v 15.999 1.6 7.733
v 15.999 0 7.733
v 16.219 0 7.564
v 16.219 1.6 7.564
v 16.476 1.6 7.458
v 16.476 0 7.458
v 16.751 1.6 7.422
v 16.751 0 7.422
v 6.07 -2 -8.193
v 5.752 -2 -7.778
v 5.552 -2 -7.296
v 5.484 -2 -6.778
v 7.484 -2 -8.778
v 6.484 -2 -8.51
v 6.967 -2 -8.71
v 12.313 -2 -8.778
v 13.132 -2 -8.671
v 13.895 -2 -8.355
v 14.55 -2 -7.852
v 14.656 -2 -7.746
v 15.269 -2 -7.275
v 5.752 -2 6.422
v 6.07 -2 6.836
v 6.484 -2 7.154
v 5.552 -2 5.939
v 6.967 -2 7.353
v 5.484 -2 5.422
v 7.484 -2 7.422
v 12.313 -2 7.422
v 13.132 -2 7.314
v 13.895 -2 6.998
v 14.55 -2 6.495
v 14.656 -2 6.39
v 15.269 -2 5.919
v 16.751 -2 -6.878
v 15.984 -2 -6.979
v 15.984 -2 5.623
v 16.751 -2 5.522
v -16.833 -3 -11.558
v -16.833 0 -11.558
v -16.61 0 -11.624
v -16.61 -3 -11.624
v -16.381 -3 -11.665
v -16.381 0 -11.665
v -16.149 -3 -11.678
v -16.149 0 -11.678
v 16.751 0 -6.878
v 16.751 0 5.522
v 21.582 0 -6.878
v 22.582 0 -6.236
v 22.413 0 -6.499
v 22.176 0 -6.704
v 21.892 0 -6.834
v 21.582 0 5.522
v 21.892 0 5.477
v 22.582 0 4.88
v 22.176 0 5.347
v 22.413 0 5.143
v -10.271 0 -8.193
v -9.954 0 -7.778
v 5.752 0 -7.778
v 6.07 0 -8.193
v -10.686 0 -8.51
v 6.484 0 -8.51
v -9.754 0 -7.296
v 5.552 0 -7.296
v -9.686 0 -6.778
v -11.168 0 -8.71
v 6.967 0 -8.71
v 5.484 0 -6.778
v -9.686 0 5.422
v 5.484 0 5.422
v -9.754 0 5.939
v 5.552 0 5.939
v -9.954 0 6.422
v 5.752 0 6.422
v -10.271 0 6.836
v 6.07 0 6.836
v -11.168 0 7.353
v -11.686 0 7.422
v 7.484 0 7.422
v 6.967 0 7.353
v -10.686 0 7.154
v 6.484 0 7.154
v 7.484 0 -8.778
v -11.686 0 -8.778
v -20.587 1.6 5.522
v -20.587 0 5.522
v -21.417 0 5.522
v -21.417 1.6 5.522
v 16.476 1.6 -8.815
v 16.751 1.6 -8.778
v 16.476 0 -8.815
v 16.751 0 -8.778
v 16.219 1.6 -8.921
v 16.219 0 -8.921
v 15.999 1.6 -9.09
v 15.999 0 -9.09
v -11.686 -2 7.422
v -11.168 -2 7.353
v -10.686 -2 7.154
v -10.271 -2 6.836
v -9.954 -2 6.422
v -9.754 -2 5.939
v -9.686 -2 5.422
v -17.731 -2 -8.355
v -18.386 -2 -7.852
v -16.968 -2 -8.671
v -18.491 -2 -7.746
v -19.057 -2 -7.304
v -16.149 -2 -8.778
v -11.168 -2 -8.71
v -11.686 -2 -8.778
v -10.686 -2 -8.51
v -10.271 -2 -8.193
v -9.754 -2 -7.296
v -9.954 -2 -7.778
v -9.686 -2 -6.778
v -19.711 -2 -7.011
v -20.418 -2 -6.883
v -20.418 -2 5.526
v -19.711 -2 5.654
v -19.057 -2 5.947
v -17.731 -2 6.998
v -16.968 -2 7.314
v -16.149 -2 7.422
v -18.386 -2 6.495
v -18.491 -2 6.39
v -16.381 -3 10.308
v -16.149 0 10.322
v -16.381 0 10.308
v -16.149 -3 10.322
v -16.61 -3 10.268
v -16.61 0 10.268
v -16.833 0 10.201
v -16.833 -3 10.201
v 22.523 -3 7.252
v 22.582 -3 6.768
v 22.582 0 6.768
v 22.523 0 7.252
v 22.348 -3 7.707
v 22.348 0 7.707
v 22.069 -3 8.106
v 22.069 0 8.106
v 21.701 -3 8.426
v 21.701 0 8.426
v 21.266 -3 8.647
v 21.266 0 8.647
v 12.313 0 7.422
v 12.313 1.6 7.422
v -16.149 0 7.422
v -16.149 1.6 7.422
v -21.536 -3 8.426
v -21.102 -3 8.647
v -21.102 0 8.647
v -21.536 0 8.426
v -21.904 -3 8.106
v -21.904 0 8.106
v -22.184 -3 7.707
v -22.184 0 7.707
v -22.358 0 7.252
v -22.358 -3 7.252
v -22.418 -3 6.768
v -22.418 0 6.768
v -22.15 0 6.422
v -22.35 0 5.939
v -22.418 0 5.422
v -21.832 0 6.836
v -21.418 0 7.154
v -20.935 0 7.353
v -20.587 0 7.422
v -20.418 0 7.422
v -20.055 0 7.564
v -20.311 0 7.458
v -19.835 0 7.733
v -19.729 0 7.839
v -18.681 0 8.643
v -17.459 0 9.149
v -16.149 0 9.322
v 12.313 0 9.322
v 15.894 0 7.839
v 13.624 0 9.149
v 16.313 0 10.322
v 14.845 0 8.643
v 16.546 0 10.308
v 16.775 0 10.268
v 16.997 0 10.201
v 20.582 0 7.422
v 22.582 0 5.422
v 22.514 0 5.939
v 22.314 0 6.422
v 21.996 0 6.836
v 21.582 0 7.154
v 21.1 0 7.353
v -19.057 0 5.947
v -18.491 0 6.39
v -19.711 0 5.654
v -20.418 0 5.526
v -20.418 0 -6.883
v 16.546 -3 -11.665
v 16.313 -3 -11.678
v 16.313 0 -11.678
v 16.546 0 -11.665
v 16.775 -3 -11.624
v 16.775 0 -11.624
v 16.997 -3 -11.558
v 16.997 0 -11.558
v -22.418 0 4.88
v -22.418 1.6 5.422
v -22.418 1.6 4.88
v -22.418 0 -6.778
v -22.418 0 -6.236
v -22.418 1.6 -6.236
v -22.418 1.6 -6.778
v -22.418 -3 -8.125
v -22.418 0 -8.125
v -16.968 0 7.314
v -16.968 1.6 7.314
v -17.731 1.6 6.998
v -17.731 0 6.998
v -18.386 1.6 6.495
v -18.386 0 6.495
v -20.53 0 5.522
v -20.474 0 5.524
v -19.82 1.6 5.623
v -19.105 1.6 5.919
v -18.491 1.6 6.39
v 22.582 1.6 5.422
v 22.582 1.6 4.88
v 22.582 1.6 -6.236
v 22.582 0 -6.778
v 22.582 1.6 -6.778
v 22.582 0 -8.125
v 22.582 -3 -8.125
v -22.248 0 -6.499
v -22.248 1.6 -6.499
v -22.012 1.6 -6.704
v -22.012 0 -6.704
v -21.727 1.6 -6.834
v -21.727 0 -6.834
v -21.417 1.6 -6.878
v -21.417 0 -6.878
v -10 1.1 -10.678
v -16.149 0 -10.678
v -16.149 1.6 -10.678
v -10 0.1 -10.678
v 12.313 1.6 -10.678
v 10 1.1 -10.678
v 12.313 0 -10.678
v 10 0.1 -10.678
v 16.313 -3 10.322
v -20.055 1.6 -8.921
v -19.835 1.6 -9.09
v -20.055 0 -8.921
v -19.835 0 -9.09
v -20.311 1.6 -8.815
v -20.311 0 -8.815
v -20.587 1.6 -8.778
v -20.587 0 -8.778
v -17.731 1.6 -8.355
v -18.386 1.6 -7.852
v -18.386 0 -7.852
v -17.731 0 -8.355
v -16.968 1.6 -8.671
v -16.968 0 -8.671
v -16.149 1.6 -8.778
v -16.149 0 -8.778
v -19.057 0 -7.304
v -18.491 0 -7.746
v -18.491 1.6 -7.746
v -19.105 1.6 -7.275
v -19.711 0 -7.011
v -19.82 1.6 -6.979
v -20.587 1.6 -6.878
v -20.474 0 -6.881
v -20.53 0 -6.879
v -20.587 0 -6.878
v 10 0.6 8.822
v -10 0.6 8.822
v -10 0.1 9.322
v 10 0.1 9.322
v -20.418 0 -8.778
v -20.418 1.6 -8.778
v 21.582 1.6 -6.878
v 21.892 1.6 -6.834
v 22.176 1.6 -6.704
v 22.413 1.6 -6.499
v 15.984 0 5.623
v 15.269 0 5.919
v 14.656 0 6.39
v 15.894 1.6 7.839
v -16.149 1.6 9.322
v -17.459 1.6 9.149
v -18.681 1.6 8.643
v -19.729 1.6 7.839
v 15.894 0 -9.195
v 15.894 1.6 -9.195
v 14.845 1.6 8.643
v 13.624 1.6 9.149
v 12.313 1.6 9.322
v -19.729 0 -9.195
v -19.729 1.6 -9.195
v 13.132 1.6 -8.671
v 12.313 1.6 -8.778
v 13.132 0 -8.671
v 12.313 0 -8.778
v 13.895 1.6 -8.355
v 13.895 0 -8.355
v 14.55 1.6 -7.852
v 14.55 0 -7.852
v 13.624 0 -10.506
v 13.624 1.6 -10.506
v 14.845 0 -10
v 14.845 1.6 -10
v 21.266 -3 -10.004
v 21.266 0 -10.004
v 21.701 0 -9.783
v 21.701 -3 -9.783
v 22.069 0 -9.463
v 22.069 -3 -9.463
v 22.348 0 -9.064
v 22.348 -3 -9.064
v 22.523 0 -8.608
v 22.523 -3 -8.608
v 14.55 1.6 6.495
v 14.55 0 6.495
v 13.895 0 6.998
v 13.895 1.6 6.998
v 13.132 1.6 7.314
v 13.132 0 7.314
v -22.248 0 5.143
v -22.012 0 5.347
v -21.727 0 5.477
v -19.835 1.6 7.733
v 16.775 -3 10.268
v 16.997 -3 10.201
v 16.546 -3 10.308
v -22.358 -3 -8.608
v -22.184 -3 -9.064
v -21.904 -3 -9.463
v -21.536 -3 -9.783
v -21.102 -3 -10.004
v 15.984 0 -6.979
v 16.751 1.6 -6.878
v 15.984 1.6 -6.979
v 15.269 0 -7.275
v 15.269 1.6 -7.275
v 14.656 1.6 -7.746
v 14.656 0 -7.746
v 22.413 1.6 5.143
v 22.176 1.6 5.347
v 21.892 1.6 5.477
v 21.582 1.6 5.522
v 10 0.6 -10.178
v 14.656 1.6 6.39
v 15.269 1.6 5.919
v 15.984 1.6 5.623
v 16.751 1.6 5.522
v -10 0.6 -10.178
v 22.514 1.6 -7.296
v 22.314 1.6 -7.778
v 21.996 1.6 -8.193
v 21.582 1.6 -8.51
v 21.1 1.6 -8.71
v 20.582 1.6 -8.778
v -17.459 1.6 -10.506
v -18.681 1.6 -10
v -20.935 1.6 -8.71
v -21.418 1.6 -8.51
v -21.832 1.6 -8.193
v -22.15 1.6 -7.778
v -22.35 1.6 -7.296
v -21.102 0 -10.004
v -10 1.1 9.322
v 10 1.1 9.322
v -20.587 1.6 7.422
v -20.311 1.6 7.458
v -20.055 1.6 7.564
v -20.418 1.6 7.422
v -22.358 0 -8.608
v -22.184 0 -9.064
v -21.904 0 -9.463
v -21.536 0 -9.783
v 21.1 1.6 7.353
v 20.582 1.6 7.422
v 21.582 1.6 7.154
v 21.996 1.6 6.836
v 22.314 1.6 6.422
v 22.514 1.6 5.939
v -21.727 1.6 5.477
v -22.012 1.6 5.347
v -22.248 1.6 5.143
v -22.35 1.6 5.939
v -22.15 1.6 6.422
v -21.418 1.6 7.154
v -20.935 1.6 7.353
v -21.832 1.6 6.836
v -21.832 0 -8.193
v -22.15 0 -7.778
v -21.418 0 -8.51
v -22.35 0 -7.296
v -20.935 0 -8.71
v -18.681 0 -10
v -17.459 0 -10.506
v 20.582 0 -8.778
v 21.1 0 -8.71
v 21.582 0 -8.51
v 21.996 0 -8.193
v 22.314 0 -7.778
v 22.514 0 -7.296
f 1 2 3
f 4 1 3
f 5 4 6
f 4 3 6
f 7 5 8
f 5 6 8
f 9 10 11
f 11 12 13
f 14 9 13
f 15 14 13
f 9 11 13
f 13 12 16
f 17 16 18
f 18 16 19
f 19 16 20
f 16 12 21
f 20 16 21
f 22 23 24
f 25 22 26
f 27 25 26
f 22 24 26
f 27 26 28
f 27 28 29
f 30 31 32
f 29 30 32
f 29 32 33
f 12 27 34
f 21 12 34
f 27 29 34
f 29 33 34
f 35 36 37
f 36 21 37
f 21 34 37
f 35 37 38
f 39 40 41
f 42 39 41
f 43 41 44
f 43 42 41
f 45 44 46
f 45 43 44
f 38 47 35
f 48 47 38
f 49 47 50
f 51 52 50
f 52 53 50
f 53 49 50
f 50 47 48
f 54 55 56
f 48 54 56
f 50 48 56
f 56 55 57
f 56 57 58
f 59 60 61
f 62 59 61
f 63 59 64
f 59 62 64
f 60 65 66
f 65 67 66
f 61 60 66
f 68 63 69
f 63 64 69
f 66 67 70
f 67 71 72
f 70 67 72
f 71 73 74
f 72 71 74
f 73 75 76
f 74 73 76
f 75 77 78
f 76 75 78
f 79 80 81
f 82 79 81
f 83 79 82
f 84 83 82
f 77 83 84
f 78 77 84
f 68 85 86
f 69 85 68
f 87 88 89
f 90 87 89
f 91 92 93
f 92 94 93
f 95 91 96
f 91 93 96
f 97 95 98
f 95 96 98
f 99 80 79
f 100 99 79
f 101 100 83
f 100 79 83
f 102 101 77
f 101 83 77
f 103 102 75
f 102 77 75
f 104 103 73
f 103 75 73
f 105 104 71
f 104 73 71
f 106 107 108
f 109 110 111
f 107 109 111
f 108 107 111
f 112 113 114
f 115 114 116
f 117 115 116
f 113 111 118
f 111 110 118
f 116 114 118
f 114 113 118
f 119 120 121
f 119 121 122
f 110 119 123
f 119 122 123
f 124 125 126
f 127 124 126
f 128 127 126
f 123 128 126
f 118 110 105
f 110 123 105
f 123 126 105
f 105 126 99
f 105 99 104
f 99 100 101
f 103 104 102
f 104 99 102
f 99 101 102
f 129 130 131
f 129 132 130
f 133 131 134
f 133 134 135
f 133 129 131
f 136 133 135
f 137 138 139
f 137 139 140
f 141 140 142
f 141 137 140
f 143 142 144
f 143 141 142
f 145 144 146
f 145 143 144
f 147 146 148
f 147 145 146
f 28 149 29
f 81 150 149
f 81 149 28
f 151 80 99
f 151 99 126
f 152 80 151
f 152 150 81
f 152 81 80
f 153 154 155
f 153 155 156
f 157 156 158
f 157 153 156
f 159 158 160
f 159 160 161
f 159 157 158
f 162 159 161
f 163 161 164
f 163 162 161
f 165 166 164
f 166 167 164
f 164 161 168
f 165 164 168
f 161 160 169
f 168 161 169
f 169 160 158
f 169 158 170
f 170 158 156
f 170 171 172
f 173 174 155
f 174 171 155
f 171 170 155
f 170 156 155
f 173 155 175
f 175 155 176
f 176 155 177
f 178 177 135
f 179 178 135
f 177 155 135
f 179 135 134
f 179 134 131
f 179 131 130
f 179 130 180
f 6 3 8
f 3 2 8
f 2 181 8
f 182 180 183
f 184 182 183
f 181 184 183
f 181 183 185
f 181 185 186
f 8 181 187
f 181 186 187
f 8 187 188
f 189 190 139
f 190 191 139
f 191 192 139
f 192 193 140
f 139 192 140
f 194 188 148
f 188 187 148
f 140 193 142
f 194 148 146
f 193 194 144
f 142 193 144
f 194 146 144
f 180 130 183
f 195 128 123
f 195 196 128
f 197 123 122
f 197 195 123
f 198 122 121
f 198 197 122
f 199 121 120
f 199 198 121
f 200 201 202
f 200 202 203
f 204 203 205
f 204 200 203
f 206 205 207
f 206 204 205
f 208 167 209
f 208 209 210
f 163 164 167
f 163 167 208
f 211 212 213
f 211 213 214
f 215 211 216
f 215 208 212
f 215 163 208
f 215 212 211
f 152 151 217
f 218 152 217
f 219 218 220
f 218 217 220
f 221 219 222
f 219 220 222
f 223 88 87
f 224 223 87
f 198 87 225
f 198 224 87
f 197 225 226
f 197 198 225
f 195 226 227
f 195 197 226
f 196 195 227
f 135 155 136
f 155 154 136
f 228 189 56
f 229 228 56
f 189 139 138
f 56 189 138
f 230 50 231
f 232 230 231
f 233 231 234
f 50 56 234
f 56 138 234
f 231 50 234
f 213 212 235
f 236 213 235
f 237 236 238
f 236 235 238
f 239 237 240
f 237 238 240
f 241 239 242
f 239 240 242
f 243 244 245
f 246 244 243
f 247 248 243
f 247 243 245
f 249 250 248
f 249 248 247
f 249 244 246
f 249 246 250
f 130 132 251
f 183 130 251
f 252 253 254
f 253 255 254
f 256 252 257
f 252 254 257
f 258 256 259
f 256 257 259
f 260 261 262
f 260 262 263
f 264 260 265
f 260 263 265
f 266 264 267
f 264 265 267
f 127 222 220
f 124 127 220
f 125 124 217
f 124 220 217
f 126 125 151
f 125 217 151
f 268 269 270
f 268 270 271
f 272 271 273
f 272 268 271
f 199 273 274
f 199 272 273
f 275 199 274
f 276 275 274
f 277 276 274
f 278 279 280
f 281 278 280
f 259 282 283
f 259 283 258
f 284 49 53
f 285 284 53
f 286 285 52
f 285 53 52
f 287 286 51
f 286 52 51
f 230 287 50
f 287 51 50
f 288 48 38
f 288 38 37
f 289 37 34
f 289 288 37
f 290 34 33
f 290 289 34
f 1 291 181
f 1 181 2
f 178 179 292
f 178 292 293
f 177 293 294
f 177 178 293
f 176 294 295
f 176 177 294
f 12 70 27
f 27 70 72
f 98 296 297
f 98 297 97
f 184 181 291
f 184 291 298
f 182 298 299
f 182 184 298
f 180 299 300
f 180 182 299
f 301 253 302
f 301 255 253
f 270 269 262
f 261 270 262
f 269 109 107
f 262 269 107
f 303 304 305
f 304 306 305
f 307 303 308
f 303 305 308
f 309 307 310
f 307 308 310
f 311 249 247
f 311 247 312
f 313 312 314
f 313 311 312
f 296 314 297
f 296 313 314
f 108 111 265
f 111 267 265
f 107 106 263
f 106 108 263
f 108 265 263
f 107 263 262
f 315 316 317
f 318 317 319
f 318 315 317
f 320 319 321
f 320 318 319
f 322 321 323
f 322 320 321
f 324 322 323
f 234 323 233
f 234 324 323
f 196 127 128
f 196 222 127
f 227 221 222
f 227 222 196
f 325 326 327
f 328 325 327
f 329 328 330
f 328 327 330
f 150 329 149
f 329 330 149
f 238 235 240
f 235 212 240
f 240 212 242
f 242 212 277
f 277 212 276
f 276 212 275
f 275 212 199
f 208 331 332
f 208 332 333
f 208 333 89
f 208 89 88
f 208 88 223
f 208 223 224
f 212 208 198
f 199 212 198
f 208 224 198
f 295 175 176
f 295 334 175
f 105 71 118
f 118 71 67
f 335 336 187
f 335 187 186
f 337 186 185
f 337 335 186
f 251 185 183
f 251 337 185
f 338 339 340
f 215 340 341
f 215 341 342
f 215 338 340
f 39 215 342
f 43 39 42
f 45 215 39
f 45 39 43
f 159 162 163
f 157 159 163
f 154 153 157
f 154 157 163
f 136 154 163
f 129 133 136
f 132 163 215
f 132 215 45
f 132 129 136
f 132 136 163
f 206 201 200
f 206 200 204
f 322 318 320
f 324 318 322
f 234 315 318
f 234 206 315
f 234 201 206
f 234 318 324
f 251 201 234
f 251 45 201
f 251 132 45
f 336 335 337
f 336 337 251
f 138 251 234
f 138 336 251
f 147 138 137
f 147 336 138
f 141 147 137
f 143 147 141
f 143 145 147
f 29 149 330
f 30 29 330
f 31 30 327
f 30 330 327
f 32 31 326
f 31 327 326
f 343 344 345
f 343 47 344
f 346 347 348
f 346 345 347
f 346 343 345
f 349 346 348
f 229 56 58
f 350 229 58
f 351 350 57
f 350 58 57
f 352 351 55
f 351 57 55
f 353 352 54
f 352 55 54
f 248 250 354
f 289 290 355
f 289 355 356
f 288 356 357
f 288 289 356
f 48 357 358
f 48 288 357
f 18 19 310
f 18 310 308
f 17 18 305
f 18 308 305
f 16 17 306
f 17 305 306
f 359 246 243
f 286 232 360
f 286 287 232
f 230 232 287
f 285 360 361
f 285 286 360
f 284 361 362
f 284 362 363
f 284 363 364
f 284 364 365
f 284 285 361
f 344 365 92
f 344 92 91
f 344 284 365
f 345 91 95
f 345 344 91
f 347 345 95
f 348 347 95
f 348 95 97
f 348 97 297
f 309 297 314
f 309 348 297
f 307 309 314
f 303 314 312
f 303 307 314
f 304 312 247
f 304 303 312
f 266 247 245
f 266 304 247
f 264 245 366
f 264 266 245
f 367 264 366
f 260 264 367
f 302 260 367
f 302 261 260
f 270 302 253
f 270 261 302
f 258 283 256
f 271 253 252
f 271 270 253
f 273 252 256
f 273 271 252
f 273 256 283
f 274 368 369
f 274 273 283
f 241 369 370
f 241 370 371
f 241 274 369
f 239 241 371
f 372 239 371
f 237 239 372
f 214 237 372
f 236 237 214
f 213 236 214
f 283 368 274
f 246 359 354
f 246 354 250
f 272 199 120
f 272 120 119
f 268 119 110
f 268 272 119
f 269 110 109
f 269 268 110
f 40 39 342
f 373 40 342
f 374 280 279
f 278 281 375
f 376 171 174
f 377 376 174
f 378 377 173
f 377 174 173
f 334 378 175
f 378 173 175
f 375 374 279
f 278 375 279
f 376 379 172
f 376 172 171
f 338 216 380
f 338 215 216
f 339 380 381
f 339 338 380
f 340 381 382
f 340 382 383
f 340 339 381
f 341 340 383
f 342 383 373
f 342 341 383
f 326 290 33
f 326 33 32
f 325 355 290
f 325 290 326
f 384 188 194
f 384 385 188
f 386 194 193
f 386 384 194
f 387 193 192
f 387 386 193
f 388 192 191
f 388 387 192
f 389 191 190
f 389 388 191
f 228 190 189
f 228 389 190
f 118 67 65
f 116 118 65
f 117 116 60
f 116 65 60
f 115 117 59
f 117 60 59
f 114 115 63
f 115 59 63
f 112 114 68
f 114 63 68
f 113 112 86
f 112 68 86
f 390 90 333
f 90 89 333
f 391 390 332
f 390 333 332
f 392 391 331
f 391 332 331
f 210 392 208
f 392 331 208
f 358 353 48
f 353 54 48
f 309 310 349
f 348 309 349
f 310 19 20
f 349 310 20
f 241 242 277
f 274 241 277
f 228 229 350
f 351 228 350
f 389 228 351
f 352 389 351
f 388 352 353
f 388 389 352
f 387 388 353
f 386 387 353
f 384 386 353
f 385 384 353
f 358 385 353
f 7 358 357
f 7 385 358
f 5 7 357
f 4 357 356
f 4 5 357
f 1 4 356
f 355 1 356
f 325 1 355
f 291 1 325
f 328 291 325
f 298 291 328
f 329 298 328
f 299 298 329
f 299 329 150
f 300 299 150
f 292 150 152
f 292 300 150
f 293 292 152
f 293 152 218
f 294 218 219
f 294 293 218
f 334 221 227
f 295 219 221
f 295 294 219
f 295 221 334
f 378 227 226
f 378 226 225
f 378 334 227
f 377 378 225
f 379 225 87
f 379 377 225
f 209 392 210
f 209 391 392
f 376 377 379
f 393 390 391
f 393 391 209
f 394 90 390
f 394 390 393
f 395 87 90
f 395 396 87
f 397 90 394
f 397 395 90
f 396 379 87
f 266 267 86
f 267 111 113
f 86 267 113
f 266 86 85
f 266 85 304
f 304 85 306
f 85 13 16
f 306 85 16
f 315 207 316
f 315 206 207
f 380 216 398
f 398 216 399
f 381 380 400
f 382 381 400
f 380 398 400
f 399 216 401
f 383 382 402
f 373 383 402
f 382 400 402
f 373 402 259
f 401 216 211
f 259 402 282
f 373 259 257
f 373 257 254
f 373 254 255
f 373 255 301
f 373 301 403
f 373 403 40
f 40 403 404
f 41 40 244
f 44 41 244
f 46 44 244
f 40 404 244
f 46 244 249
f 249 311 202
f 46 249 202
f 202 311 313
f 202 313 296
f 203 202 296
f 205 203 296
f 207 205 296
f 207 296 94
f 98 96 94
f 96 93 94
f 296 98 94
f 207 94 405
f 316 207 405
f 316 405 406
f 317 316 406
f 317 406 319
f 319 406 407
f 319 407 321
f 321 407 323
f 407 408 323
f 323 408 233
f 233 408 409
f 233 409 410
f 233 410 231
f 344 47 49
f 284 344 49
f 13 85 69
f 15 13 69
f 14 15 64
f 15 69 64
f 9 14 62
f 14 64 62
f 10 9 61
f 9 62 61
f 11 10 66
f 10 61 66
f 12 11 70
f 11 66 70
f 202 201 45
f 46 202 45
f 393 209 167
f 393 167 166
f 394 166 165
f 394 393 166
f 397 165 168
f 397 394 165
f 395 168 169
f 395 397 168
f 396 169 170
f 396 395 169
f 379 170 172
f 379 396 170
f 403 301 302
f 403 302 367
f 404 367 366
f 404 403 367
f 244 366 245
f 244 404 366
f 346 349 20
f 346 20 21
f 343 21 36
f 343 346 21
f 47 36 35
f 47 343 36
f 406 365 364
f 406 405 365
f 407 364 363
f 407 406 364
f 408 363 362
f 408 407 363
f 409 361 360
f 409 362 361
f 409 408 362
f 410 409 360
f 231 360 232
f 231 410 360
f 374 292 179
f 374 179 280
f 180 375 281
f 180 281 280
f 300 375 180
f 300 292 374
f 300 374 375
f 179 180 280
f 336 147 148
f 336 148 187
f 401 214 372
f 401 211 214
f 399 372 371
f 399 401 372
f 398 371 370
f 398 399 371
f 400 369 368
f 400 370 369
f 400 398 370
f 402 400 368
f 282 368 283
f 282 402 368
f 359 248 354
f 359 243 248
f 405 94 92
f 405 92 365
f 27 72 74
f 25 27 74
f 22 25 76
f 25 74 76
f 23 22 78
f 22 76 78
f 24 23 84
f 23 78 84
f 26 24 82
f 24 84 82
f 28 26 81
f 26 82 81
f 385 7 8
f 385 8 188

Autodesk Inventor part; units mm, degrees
ref_plane "YZ Plane" through (0, 0, 0) normal (1, 0, 0) x (0, 1, 0)
ref_plane "XZ Plane" through (0, 0, 0) normal (0, 1, 0) x (-1, 0, 0)
ref_plane "XY Plane" through (0, 0, 0) normal (0, 0, 1) x (1, 0, 0)
sketch "Sketch1" plane through (0, 0, 0) normal (0, 1, 0) x (-1, 0, 0)
  line L0 (-21.5822, -6.7784) -> (-16.7522, -6.7784)
  arc A0 (-14.5842, -7.6764) -> (-16.7522, -6.7784) centre (-16.751, -9.8416) ccw
  line L1 (-14.5842, -7.6764) -> (-14.4802, -7.7804)
  arc A1 (-14.4802, -7.7804) -> (-12.3122, -8.6784) centre (-12.3134, -5.6152) ccw
  line L2 (-12.3122, -8.6784) -> (16.1478, -8.6784)
  arc A2 (16.1478, -8.6784) -> (18.3158, -7.7804) centre (16.149, -5.6152) ccw
  line L3 (18.3158, -7.7804) -> (18.4198, -7.6764)
  arc A3 (20.5878, -6.7784) -> (18.4198, -7.6764) centre (20.5866, -9.8416) ccw
  line L4 (20.5878, -6.7784) -> (21.4178, -6.7784)
  arc A4 (21.4178, -6.7784) -> (22.4178, -5.7784) centre (21.4174, -5.778) ccw
  line L5 (22.4178, -5.7784) -> (22.4178, 4.4216)
  arc A5 (22.4178, 4.4216) -> (21.4178, 5.4216) centre (21.4174, 4.4213) ccw
  line L6 (21.4178, 5.4216) -> (20.5878, 5.4216)
  arc A6 (18.4198, 6.3196) -> (20.5878, 5.4216) centre (20.5866, 8.4848) ccw
  line L7 (18.4198, 6.3196) -> (18.3158, 6.4236)
  arc A7 (18.3158, 6.4236) -> (16.1478, 7.3216) centre (16.149, 4.2584) ccw
  line L8 (16.1478, 7.3216) -> (-12.3122, 7.3216)
  arc A8 (-12.3122, 7.3216) -> (-14.4802, 6.4236) centre (-12.3134, 4.2584) ccw
  line L9 (-14.4802, 6.4236) -> (-14.5842, 6.3196)
  arc A9 (-16.7522, 5.4216) -> (-14.5842, 6.3196) centre (-16.751, 8.4848) ccw
  line L10 (-16.7522, 5.4216) -> (-21.5822, 5.4216)
  arc A10 (-21.5822, 5.4216) -> (-22.5822, 4.4216) centre (-21.5819, 4.4213) ccw
  line L11 (-22.5822, 4.4216) -> (-22.5822, -5.7784)
  arc A11 (-22.5822, -5.7784) -> (-21.5822, -6.7784) centre (-21.5819, -5.778) ccw
  line L12 (19.8348, -9.0898) -> (19.7292, -9.1954)
  arc A12 (16.149, -10.6784) -> (19.7292, -9.1954) centre (16.149, -5.6152) ccw
  line L13 (16.149, -10.6784) -> (-12.3134, -10.6784)
  arc A13 (-15.8936, -9.1954) -> (-12.3134, -10.6784) centre (-12.3134, -5.6152) ccw
  line L14 (-15.8936, -9.1954) -> (-15.9992, -9.0898)
  arc A14 (-15.9992, -9.0898) -> (-16.751, -8.7784) centre (-16.751, -9.8416) ccw
  line L15 (-16.751, -8.7784) -> (-20.5822, -8.7784)
  line L16 (-20.5822, 7.4216) -> (-16.751, 7.4216)
  arc A15 (-16.751, 7.4216) -> (-15.9992, 7.733) centre (-16.751, 8.4848) ccw
  line L17 (-15.9992, 7.733) -> (-15.8936, 7.8387)
  arc A16 (-12.3134, 9.3216) -> (-15.8936, 7.8387) centre (-12.3134, 4.2584) ccw
  line L18 (-12.3134, 9.3216) -> (16.149, 9.3216)
  arc A17 (19.7292, 7.8387) -> (16.149, 9.3216) centre (16.149, 4.2584) ccw
  line L19 (19.7292, 7.8387) -> (19.8348, 7.733)
  arc A18 (19.8348, 7.733) -> (20.5866, 7.4216) centre (20.5866, 8.4848) ccw
  line L20 (20.5866, 7.4216) -> (20.4178, 7.4216)
  line L21 (20.4178, -8.7784) -> (20.5866, -8.7784)
  arc A19 (20.5866, -8.7784) -> (19.8348, -9.0898) centre (20.5866, -9.8416) ccw
  line L22 (22.4178, 5.4216) -> (22.4178, -6.7784)
  arc A20 (20.4178, -8.7784) -> (22.4178, -6.7784) centre (20.4178, -6.7784) ccw
  arc A21 (22.4178, 5.4216) -> (20.4178, 7.4216) centre (20.4178, 5.4216) ccw
  line L23 (-22.5822, 5.4216) -> (-22.5822, -6.7784)
  arc A22 (-22.5822, -6.7784) -> (-20.5822, -8.7784) centre (-20.5822, -6.7784) ccw
  arc A23 (-20.5822, 7.4216) -> (-22.5822, 5.4216) centre (-20.5822, 5.4216) ccw
  line L24 (16.149, -8.7784) -> (-12.3134, -8.7784)
  arc A24 (-14.5501, -7.8519) -> (-12.3134, -8.7784) centre (-12.3134, -5.6152) ccw
  line L25 (-14.5501, -7.8519) -> (-14.6557, -7.7463)
  arc A25 (-14.6557, -7.7463) -> (-16.751, -6.8784) centre (-16.751, -9.8416) ccw
  line L26 (-16.751, -6.8784) -> (-21.5819, -6.8784)
  arc A26 (-22.5822, -6.2363) -> (-21.5819, -6.8784) centre (-21.5819, -5.778) ccw
  arc A27 (-21.5819, 5.5216) -> (-22.5822, 4.8796) centre (-21.5819, 4.4213) ccw
  line L27 (-21.5819, 5.5216) -> (-16.751, 5.5216)
  arc A28 (-16.751, 5.5216) -> (-14.6557, 6.3895) centre (-16.751, 8.4848) ccw
  line L28 (-14.6557, 6.3895) -> (-14.5501, 6.4951)
  arc A29 (-12.3134, 7.4216) -> (-14.5501, 6.4951) centre (-12.3134, 4.2584) ccw
  line L29 (-12.3134, 7.4216) -> (16.149, 7.4216)
  arc A30 (18.3857, 6.4951) -> (16.149, 7.4216) centre (16.149, 4.2584) ccw
  line L30 (18.3857, 6.4951) -> (18.4913, 6.3895)
  arc A31 (18.4913, 6.3895) -> (20.5866, 5.5216) centre (20.5866, 8.4848) ccw
  line L31 (20.5866, 5.5216) -> (21.4174, 5.5216)
  arc A32 (22.4178, 4.8796) -> (21.4174, 5.5216) centre (21.4174, 4.4213) ccw
  arc A33 (21.4174, -6.8784) -> (22.4178, -6.2363) centre (21.4174, -5.778) ccw
  line L32 (21.4174, -6.8784) -> (20.5866, -6.8784)
  arc A34 (20.5866, -6.8784) -> (18.4913, -7.7463) centre (20.5866, -9.8416) ccw
  line L33 (18.4913, -7.7463) -> (18.3857, -7.8519)
  arc A35 (16.149, -8.7784) -> (18.3857, -7.8519) centre (16.149, -5.6152) ccw
  point P0 (-22.5822, -0.6784)
  point P1 (-22.5822, 4.4218)
  point P2 (22.4178, 4.4219)
  point P3 (22.4178, -5.7786)
  point P4 (-22.5822, -5.7785)
  dimension "d0" = 2
  dimension "d1" = 2
  dimension "d2" = 2
  dimension "d15" = 2
  dimension "d34" = 0.1
extrude "Extrusion1" add sketch "Sketch1" along normal blind 1.6 contours A26 L26 A25 L25 A24 L24 A35 L33 A34 L32 A33 L22 A20 L21 A19 L12 A12 L13 A13 L14 A14 L15 A22 L23 | L23 A23 L16 A15 L17 A16 L18 A17 L19 A18 L20 A21 L22 A32 L31 A31 L30 A30 L29 A29 L28 A28 L27 A27
sketch "Sketch2" plane through (0, 0, 0) normal (0, -1, 0) x (1, 0, 0)
  arc A0 (-22.4178, -6.7784) -> (-20.4178, -8.7784) centre (-20.4178, -6.7784) ccw projected
  line L0 (-22.4178, 4.8796) -> (-22.4178, -6.5074)
  line L1 (-20.4178, 7.4216) -> (-20.4178, -8.7784)
  arc A1 (22.5822, 5.4216) -> (20.5822, 7.4216) centre (20.5822, 5.4216) ccw projected
  arc A2 (20.5822, -8.7784) -> (22.5822, -6.7784) centre (20.5822, -6.7784) ccw projected
  line L2 (22.5822, 4.8796) -> (22.5822, -6.2363)
  line L3 (20.5822, -8.7784) -> (16.751, -8.7784) projected
  line L4 (16.751, 7.4216) -> (20.5822, 7.4216) projected
  line L5 (16.751, -8.7784) -> (16.751, 7.4216)
  line L6 (14.0619, 6.4196) -> (13.9579, 6.5236) construction
  arc A3 (13.9579, 6.5236) -> (11.7911, 7.4216) centre (11.7911, 4.3584) ccw construction
  line L7 (11.7911, 7.4216) -> (7.4843, 7.4216) construction
  line L8 (-18.6464, -8.3237) -> (-18.5319, -8.416) construction
  arc A4 (-18.5319, -8.416) -> (-17.9889, -8.7784) centre (-16.2569, -5.5955) ccw construction
  line L9 (-17.9889, -8.7784) -> (-11.6857, -8.7784) construction
  arc A5 (10.5359, -8.7784) -> (13.4025, -7.9533) centre (11.2292, -5.7946) ccw construction
  line L10 (13.4025, -7.9533) -> (13.5062, -7.849) construction
  circle A6 centre (12.1943, 5.3613) radius 1.15 construction
  circle A7 centre (7.4843, 0.5913) radius 0.5 construction
  circle A8 centre (9.4843, 0.5913) radius 0.5 construction
  circle A9 centre (9.4843, -1.9087) radius 0.5 construction
  circle A10 centre (12.1943, -6.6787) radius 1.15 construction
  circle A11 centre (7.4843, -1.9087) radius 0.5 construction
  circle A12 centre (-11.6857, -3.2087) radius 0.45 construction
  circle A13 centre (-11.6857, 0.8713) radius 0.45 construction
  circle A14 centre (-16.5257, 5.3413) radius 1.2 construction
  circle A15 centre (-14.2257, 1.8913) radius 0.45 construction
  circle A16 centre (-14.2257, -0.1487) radius 0.45 construction
  circle A17 centre (-11.6857, -1.1687) radius 0.45 construction
  circle A18 centre (-14.2257, -2.1887) radius 0.45 construction
  circle A19 centre (-16.5257, -6.6587) radius 1.2 construction
  line L11 (-9.6857, 5.4216) -> (-9.6857, -6.7784)
  line L12 (5.4843, -6.7784) -> (5.4843, 5.4216)
  arc A20 (7.4843, 7.4216) -> (5.4843, 5.4216) centre (7.4843, 5.4216) ccw
  arc A21 (-11.6857, -8.7784) -> (-9.6857, -6.7784) centre (-11.6857, -6.7784) ccw
  line L13 (7.4843, -8.7784) -> (6.6499, -8.7784)
  arc A22 (5.4843, -6.7784) -> (7.4843, -8.7784) centre (7.4843, -6.7784) ccw
  line L14 (-11.6857, 7.4216) -> (-12.246, 7.4216)
  arc A23 (-9.6857, 5.4216) -> (-11.6857, 7.4216) centre (-11.6857, 5.4216) ccw
  line L15 (-12.246, 7.4216) -> (7.4843, 7.4216)
  line L16 (12.3134, 7.4216) -> (-16.149, 7.4216) projected
  line L17 (-16.149, -8.7784) -> (12.3134, -8.7784) projected
  line L18 (-22.4178, -6.7784) -> (-22.4178, -6.2363) projected
  line L19 (16.751, -6.8784) -> (21.5819, -6.8784) projected
  arc A24 (21.5819, -6.8784) -> (22.5822, -6.2363) centre (21.5819, -5.778) ccw projected
  arc A25 (22.5822, 4.8796) -> (21.5819, 5.5216) centre (21.5819, 4.4213) ccw projected
  line L20 (21.5819, 5.5216) -> (16.751, 5.5216) projected
  line L21 (-20.5866, 5.5216) -> (-21.4174, 5.5216) projected
  arc A26 (-20.5866, 5.5216) -> (-18.4913, 6.3895) centre (-20.5866, 8.4848) ccw projected
  arc A27 (-21.4174, 5.5216) -> (-22.4178, 4.8796) centre (-21.4174, 4.4213) ccw projected
  line L22 (-21.4174, -6.8784) -> (-20.5866, -6.8784) projected
  arc A28 (-22.4178, -6.2363) -> (-21.4174, -6.8784) centre (-21.4174, -5.778) ccw projected
  arc A29 (-18.4913, -7.7463) -> (-20.5866, -6.8784) centre (-20.5866, -9.8416) ccw projected
  line L23 (22.5822, 5.4216) -> (22.5822, 4.8796) projected
  arc A30 (22.5822, 5.4216) -> (20.5822, 7.4216) centre (20.5822, 5.4216) ccw projected
  line L24 (16.751, 7.4216) -> (20.5822, 7.4216) projected
  arc A31 (15.9992, 7.733) -> (16.751, 7.4216) centre (16.751, 8.4848) ccw projected
  line L25 (15.8936, 7.8387) -> (15.9992, 7.733) projected
  arc A32 (15.8936, 7.8387) -> (12.3134, 9.3216) centre (12.3134, 4.2584) ccw projected
  line L26 (-16.149, 9.3216) -> (12.3134, 9.3216) projected
  arc A33 (-16.149, 9.3216) -> (-19.7292, 7.8387) centre (-16.149, 4.2584) ccw projected
  line L27 (-19.8348, 7.733) -> (-19.7292, 7.8387) projected
  arc A34 (-20.5866, 7.4216) -> (-19.8348, 7.733) centre (-20.5866, 8.4848) ccw projected
  line L28 (-20.4178, 7.4216) -> (-20.5866, 7.4216) projected
  arc A35 (-20.4178, 7.4216) -> (-22.4178, 5.4216) centre (-20.4178, 5.4216) ccw projected
  line L29 (-22.4178, 4.8796) -> (-22.4178, 5.4216) projected
  arc A36 (-21.4174, 5.5216) -> (-22.4178, 4.8796) centre (-21.4174, 4.4213) ccw projected
  line L30 (-20.5866, 5.5216) -> (-21.4174, 5.5216) projected
  arc A37 (-20.5866, 5.5216) -> (-18.4913, 6.3895) centre (-20.5866, 8.4848) ccw projected
  line L31 (-18.3857, 6.4951) -> (-18.4913, 6.3895) projected
  arc A38 (-16.149, 7.4216) -> (-18.3857, 6.4951) centre (-16.149, 4.2584) ccw projected
  line L32 (12.3134, 7.4216) -> (-16.149, 7.4216) projected
  arc A39 (14.5501, 6.4951) -> (12.3134, 7.4216) centre (12.3134, 4.2584) ccw projected
  line L33 (14.6557, 6.3895) -> (14.5501, 6.4951) projected
  arc A40 (14.6557, 6.3895) -> (16.751, 5.5216) centre (16.751, 8.4848) ccw projected
  line L34 (21.5819, 5.5216) -> (16.751, 5.5216) projected
  arc A41 (22.5822, 4.8796) -> (21.5819, 5.5216) centre (21.5819, 4.4213) ccw projected
  line L35 (20.5822, -8.7784) -> (16.751, -8.7784) projected
  arc A42 (20.5822, -8.7784) -> (22.5822, -6.7784) centre (20.5822, -6.7784) ccw projected
  line L36 (22.5822, -6.2363) -> (22.5822, -6.7784) projected
  arc A43 (21.5819, -6.8784) -> (22.5822, -6.2363) centre (21.5819, -5.778) ccw projected
  line L37 (16.751, -6.8784) -> (21.5819, -6.8784) projected
  arc A44 (16.751, -6.8784) -> (14.6557, -7.7463) centre (16.751, -9.8416) ccw projected
  line L38 (14.5501, -7.8519) -> (14.6557, -7.7463) projected
  arc A45 (12.3134, -8.7784) -> (14.5501, -7.8519) centre (12.3134, -5.6152) ccw projected
  line L39 (-16.149, -8.7784) -> (12.3134, -8.7784) projected
  arc A46 (-18.3857, -7.8519) -> (-16.149, -8.7784) centre (-16.149, -5.6152) ccw projected
  line L40 (-18.4913, -7.7463) -> (-18.3857, -7.8519) projected
  arc A47 (-18.4913, -7.7463) -> (-20.5866, -6.8784) centre (-20.5866, -9.8416) ccw projected
  line L41 (-21.4174, -6.8784) -> (-20.5866, -6.8784) projected
  arc A48 (-22.4178, -6.2363) -> (-21.4174, -6.8784) centre (-21.4174, -5.778) ccw projected
  line L42 (-22.4178, -6.7784) -> (-22.4178, -6.2363) projected
  arc A49 (-22.4178, -6.7784) -> (-20.4178, -8.7784) centre (-20.4178, -6.7784) ccw projected
  line L43 (-20.5866, -8.7784) -> (-20.4178, -8.7784) projected
  arc A50 (-19.8348, -9.0898) -> (-20.5866, -8.7784) centre (-20.5866, -9.8416) ccw projected
  line L44 (-19.7292, -9.1954) -> (-19.8348, -9.0898) projected
  arc A51 (-19.7292, -9.1954) -> (-16.149, -10.6784) centre (-16.149, -5.6152) ccw projected
  line L45 (12.3134, -10.6784) -> (-16.149, -10.6784) projected
  arc A52 (12.3134, -10.6784) -> (15.8936, -9.1954) centre (12.3134, -5.6152) ccw projected
  line L46 (15.9992, -9.0898) -> (15.8936, -9.1954) projected
  arc A53 (16.751, -8.7784) -> (15.9992, -9.0898) centre (16.751, -9.8416) ccw projected
  point P0 (0, 0)
  point P1 (-9.6857, 7.4216)
  point P2 (5.4843, -10.0483)
  point P3 (5.4843, 5.9259)
  point P4 (-2.3809, 7.4216)
  point P5 (-2.1007, -8.6784)
  point P6 (-20.4178, -6.8832)
  point P7 (-20.4178, 5.5264)
  point P8 (-18.4913, 6.3895)
  point P9 (22.5822, 4.8796)
  point P10 (22.5822, 5.4216)
  point P11 (-18.4913, -7.7463)
  point P12 (-20.4178, -8.7784)
  point P13 (22.5822, -6.2363)
  dimension "d6" = 2
  dimension "d7" = 2
  dimension "d8" = 2
  dimension "d9" = 2
  dimension "d10" = 2
extrude "Extrusion2" add sketch "Sketch2" along normal blind 2 contours L18 L0 A28 L22 A29 L1 A0 | L1 A29 L40 A46 L17 L13 A45 L38 A44 L5 A53 L46 A52 L45 A51 L44 A50 L43 | A29 L22 A28 L0 A27 L21 A26 L1 | A26 L21 A27 L29 A35 L1 | L1 L28 A34 L27 A33 L26 A32 L25 A31 L5 A40 L33 A39 L16 L15 L14 A38 L31 A26 | A21 L11 A23 L15 A20 L12 A22 L13 L17 | L5 L19 A24 L36 A2 L3 | L5 L20 A25 L2 A24 L19 | L5 L4 A1 L23 A25 L20
sketch "Sketch3" plane through (0, -2, 0) normal (0, -1, 0) x (1, 0, 0)
  arc A0 (-22.4178, -6.7784) -> (-20.4178, -8.7784) centre (-20.4178, -6.7784) ccw projected
  line L0 (-20.4178, -6.8832) -> (-20.4178, 5.5264) projected
  arc A1 (-20.4178, 5.5264) -> (-18.4913, 6.3895) centre (-20.5866, 8.4848) ccw projected
  line L1 (-20.4178, -8.7784) -> (-20.5866, -8.7784) projected
  arc A2 (-19.8348, -9.0898) -> (-20.5866, -8.7784) centre (-20.5866, -9.8416) ccw projected
  line L2 (-19.8348, -9.0898) -> (-19.7292, -9.1954) projected
  arc A3 (-19.7292, -9.1954) -> (-16.149, -10.6784) centre (-16.149, -5.6152) ccw projected
  line L3 (-16.149, -10.6784) -> (12.3134, -10.6784) projected
  arc A4 (12.3134, -10.6784) -> (15.8936, -9.1954) centre (12.3134, -5.6152) ccw projected
  line L4 (15.8936, -9.1954) -> (15.9992, -9.0898) projected
  arc A5 (16.751, -8.7784) -> (15.9992, -9.0898) centre (16.751, -9.8416) ccw projected
  line L5 (16.751, -8.7784) -> (20.5822, -8.7784) projected
  arc A6 (20.5822, -8.7784) -> (22.5822, -6.7784) centre (20.5822, -6.7784) ccw projected
  line L6 (22.5822, -6.7784) -> (22.5822, 5.4216) projected
  arc A7 (22.5822, 5.4216) -> (20.5822, 7.4216) centre (20.5822, 5.4216) ccw projected
  line L7 (20.5822, 7.4216) -> (16.751, 7.4216) projected
  arc A8 (15.9992, 7.733) -> (16.751, 7.4216) centre (16.751, 8.4848) ccw projected
  line L8 (15.9992, 7.733) -> (15.8936, 7.8387) projected
  arc A9 (15.8936, 7.8387) -> (12.3134, 9.3216) centre (12.3134, 4.2584) ccw projected
  line L9 (12.3134, 9.3216) -> (-16.149, 9.3216) projected
  arc A10 (-16.149, 9.3216) -> (-19.7292, 7.8387) centre (-16.149, 4.2584) ccw projected
  line L10 (-19.7292, 7.8387) -> (-19.8348, 7.733) projected
  arc A11 (-20.5866, 7.4216) -> (-19.8348, 7.733) centre (-20.5866, 8.4848) ccw projected
  line L11 (-20.5866, 7.4216) -> (-20.4178, 7.4216) projected
  arc A12 (-20.4178, 7.4216) -> (-22.4178, 5.4216) centre (-20.4178, 5.4216) ccw projected
  line L12 (-22.4178, 5.4216) -> (-22.4178, -6.7784) projected
  line L13 (-11.6857, -8.7784) -> (-16.149, -8.7784) projected
  arc A13 (-18.3857, -7.8519) -> (-16.149, -8.7784) centre (-16.149, -5.6152) ccw projected
  line L14 (-18.3857, -7.8519) -> (-18.4913, -7.7463) projected
  arc A14 (-18.4913, -7.7463) -> (-20.4178, -6.8832) centre (-20.5866, -9.8416) ccw projected
  line L15 (-18.4913, 6.3895) -> (-18.3857, 6.4951) projected
  arc A15 (-16.149, 7.4216) -> (-18.3857, 6.4951) centre (-16.149, 4.2584) ccw projected
  line L16 (-16.149, 7.4216) -> (-11.6857, 7.4216) projected
  arc A16 (-9.6857, 5.4216) -> (-11.6857, 7.4216) centre (-11.6857, 5.4216) ccw projected
  line L17 (-9.6857, 5.4216) -> (-9.6857, -6.7784) projected
  arc A17 (-11.6857, -8.7784) -> (-9.6857, -6.7784) centre (-11.6857, -6.7784) ccw projected
  point P0 (0, 0)
extrude "Extrusion3" add sketch "Sketch3" along normal blind 1 contours L12 A12 L11 A11 L10 A10 L9 A9 L8 A8 L7 A7 L6 A6 L5 A5 L4 A4 L3 A3 L2 A2 L1 A0 | L0 A1 L15 A15 L16 A16 L17 A17 L13 A13 L14 A14
sketch "Sketch4" plane through (0, -3, 0) normal (0, -1, 0) x (1, 0, 0)
  arc A0 (-22.4178, -6.7784) -> (-20.4178, -8.7784) centre (-20.4178, -6.7784) ccw projected
  line L0 (-16.149, 10.3216) -> (16.3134, 10.3216)
  line L1 (16.3134, -11.6784) -> (-16.149, -11.6784)
  line L2 (22.5822, -8.1246) -> (22.5822, 6.7679)
  line L3 (-22.4178, 5.4216) -> (-22.4178, -6.7784)
  arc A1 (21.2663, -10.004) -> (22.5822, -8.1246) centre (20.5822, -8.1246) ccw
  arc A2 (22.5822, 6.7679) -> (21.2663, 8.6473) centre (20.5822, 6.7679) ccw
  line L4 (-22.4178, -8.1246) -> (-22.4178, 6.7679)
  line L5 (-21.1018, 8.6473) -> (-16.833, 10.201)
  line L6 (-16.833, -11.5578) -> (-21.1018, -10.004)
  arc A3 (-21.1018, 8.6473) -> (-22.4178, 6.7679) centre (-20.4178, 6.7679) ccw
  arc A4 (-16.149, 10.3216) -> (-16.833, 10.201) centre (-16.149, 8.3216) ccw
  arc A5 (-16.833, -11.5578) -> (-16.149, -11.6784) centre (-16.149, -9.6784) ccw
  arc A6 (-22.4178, -8.1246) -> (-21.1018, -10.004) centre (-20.4178, -8.1246) ccw
  line L7 (16.9974, -11.5578) -> (21.2663, -10.004)
  line L8 (21.2663, 8.6473) -> (16.9974, 10.201)
  arc A7 (16.9974, 10.201) -> (16.3134, 10.3216) centre (16.3134, 8.3216) ccw
  arc A8 (16.3134, -11.6784) -> (16.9974, -11.5578) centre (16.3134, -9.6784) ccw
  arc A9 (-20.4178, 7.4216) -> (-22.4178, 5.4216) centre (-20.4178, 5.4216) ccw projected
  line L9 (-22.4178, 5.4216) -> (-22.4178, -6.7784) projected
  line L10 (-20.4178, -8.7784) -> (-20.5866, -8.7784) projected
  arc A10 (-19.8348, -9.0898) -> (-20.5866, -8.7784) centre (-20.5866, -9.8416) ccw projected
  line L11 (-19.8348, -9.0898) -> (-19.7292, -9.1954) projected
  arc A11 (-19.7292, -9.1954) -> (-16.149, -10.6784) centre (-16.149, -5.6152) ccw projected
  line L12 (-16.149, -10.6784) -> (12.3134, -10.6784) projected
  arc A12 (12.3134, -10.6784) -> (15.8936, -9.1954) centre (12.3134, -5.6152) ccw projected
  line L13 (15.8936, -9.1954) -> (15.9992, -9.0898) projected
  arc A13 (16.751, -8.7784) -> (15.9992, -9.0898) centre (16.751, -9.8416) ccw projected
  line L14 (16.751, -8.7784) -> (20.5822, -8.7784) projected
  arc A14 (20.5822, -8.7784) -> (22.5822, -6.7784) centre (20.5822, -6.7784) ccw projected
  line L15 (22.5822, -6.7784) -> (22.5822, 5.4216) projected
  arc A15 (22.5822, 5.4216) -> (20.5822, 7.4216) centre (20.5822, 5.4216) ccw projected
  line L16 (20.5822, 7.4216) -> (16.751, 7.4216) projected
  arc A16 (15.9992, 7.733) -> (16.751, 7.4216) centre (16.751, 8.4848) ccw projected
  line L17 (15.9992, 7.733) -> (15.8936, 7.8387) projected
  arc A17 (15.8936, 7.8387) -> (12.3134, 9.3216) centre (12.3134, 4.2584) ccw projected
  line L18 (12.3134, 9.3216) -> (-16.149, 9.3216) projected
  arc A18 (-16.149, 9.3216) -> (-19.7292, 7.8387) centre (-16.149, 4.2584) ccw projected
  line L19 (-19.7292, 7.8387) -> (-19.8348, 7.733) projected
  arc A19 (-20.5866, 7.4216) -> (-19.8348, 7.733) centre (-20.5866, 8.4848) ccw projected
  line L20 (-20.5866, 7.4216) -> (-20.4178, 7.4216) projected
  point P0 (0.0822, -11.6784)
  point P1 (22.5822, -0.6784)
  point P2 (-22.4178, -0.6784)
  point P3 (-22.4178, -6.7784)
  point P4 (22.5822, -6.7784)
  dimension "d16" = 2
  dimension "d19" = 2
  dimension "d20" = 4.2688
  dimension "d21" = 160
  dimension "d22" = 160
  dimension "d23" = 2
extrude "Extrusion4" add sketch "Sketch4" against normal blind 3 contours A0 L10 A10 L11 A11 L12 A12 L13 A13 L14 A14 L2 A1 L7 A8 L1 A5 L6 A6 L4 | L4 A3 L5 A4 L0 A7 L8 A2 L2 A15 L16 A16 L17 A17 L18 A18 L19 A19 L20 A9
sketch "Sketch5" plane through (0, 0, 0) normal (1, 0, 0) x (0, 1, 0)
  line L0 (0, 9.3216) -> (1.6, 9.3216) projected
  line L1 (1.1, 9.3216) -> (0.6, 8.8216)
  line L2 (0.6, 8.8216) -> (0.1, 9.3216)
  line L3 (0, -10.6784) -> (1.6, -10.6784) projected
  line L4 (1.1, -10.6784) -> (0.6, -10.1784)
  line L5 (0.6, -10.1784) -> (0.1, -10.6784)
  point P0 (0, 0)
  dimension "d26" = 0.5
  dimension "d27" = 0.5
  dimension "d28" = 0.5
  dimension "d29" = 0.5
extrude "Extrusion5" cut sketch "Sketch5" along normal mid plane 20
properties part number "Housing_Lower"
